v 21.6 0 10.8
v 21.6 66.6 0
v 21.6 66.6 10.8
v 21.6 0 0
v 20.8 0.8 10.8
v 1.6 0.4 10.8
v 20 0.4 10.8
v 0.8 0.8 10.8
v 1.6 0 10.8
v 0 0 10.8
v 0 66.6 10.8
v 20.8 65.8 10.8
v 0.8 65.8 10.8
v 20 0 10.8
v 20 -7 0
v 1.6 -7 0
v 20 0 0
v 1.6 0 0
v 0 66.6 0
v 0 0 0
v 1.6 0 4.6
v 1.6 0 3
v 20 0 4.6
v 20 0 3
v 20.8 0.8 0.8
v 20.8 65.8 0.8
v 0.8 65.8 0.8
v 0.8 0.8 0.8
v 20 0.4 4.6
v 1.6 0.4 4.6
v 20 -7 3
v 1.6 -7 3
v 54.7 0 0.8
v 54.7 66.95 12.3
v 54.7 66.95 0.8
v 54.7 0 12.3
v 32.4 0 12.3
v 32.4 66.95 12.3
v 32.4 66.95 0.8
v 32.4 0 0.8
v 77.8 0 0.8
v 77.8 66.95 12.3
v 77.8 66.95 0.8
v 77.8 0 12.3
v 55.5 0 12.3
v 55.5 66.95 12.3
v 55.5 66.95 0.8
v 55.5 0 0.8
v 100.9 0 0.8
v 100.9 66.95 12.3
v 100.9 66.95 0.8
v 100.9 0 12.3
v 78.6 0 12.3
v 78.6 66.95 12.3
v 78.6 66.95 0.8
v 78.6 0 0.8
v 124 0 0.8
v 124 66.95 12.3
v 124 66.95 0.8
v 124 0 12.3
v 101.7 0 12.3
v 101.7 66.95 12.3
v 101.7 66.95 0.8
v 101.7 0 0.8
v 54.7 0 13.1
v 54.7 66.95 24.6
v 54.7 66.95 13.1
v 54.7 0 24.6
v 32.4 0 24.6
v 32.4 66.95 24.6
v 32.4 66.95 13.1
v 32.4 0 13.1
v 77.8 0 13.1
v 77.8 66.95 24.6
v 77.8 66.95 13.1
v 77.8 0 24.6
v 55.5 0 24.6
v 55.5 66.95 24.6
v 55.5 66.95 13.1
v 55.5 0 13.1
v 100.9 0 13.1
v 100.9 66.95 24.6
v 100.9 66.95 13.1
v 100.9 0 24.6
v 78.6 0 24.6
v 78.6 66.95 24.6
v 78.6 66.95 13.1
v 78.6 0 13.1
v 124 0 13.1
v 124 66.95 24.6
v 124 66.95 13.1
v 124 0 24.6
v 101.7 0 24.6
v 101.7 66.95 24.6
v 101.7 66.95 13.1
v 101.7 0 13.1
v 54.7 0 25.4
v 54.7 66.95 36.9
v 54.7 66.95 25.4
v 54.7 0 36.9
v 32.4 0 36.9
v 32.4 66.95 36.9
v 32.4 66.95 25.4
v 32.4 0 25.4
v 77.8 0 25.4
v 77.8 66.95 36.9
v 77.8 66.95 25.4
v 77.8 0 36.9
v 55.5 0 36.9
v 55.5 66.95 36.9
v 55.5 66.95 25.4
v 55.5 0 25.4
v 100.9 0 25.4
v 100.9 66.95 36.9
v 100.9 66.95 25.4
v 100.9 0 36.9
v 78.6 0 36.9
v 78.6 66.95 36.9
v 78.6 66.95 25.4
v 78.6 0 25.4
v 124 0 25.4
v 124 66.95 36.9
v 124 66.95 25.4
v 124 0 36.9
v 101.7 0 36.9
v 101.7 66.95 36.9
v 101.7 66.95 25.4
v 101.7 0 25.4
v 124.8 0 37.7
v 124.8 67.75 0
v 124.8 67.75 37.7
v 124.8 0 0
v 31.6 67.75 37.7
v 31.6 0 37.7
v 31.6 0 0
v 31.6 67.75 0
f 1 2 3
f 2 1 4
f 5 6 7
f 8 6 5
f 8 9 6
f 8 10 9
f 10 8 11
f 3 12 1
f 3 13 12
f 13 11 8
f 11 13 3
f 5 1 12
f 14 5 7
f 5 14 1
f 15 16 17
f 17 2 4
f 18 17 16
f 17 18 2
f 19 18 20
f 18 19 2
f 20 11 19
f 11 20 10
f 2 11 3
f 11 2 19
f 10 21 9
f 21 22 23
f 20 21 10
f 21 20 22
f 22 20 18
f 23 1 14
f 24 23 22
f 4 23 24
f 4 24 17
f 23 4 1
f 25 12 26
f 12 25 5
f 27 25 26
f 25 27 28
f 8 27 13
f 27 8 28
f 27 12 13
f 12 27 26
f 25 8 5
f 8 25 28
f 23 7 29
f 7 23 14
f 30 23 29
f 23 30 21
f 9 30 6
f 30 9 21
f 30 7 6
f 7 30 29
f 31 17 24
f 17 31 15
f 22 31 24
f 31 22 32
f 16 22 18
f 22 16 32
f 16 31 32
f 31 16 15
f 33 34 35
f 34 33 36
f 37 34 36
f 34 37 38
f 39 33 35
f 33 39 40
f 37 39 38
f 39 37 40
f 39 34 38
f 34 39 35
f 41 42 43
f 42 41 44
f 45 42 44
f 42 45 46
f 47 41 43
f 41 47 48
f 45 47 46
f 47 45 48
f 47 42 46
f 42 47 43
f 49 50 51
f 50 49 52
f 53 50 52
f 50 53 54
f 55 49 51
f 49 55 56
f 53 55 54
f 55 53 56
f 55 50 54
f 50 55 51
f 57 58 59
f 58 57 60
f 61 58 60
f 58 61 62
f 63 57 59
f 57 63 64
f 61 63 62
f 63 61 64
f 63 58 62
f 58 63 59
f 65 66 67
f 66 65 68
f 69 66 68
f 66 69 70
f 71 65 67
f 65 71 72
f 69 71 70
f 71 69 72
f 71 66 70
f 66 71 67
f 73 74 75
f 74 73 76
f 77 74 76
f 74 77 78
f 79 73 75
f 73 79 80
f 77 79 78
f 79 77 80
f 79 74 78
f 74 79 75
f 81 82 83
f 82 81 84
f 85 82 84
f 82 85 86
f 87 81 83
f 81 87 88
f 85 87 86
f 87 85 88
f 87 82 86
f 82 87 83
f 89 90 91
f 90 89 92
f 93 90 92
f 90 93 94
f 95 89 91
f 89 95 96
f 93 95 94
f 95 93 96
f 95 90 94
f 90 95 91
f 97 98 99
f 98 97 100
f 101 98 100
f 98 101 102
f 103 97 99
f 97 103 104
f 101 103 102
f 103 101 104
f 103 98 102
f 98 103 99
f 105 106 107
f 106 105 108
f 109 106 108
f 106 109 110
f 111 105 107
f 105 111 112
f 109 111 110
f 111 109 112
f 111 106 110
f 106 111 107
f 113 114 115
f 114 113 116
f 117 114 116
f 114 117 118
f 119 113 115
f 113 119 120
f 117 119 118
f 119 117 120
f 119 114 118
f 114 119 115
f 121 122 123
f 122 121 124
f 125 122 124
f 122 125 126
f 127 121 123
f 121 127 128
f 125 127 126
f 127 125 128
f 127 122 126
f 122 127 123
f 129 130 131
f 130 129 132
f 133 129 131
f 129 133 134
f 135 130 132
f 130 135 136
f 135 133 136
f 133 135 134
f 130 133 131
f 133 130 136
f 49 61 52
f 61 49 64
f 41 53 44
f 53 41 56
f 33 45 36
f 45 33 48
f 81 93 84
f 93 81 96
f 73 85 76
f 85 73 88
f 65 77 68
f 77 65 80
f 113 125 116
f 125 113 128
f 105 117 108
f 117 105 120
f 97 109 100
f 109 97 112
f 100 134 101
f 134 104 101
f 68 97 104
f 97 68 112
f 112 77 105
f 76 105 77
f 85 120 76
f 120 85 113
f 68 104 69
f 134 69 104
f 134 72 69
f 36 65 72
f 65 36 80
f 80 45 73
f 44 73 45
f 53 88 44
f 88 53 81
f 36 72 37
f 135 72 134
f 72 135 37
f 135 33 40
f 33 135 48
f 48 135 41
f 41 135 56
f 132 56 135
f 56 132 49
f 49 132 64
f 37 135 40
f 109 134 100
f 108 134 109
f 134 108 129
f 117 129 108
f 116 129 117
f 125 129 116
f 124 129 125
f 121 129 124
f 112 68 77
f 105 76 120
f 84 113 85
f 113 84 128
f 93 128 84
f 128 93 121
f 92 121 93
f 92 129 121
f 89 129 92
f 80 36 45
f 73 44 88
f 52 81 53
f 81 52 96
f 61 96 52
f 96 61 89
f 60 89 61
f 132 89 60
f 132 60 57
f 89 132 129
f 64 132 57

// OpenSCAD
// preview[view:south west, tilt:top diagonal]

/* [Drawer: Base] */
// Inner width of the drawer
drawerWidthInner = 20;
// Inner height of the drawer
drawerHeightInner = 10;
// Inner length of the drawer
drawerLengthInner = 65;

/* [Drawer: Label] */
// Enable cutout for a label?
enabelLabel = "true"; // [true,false]
// The depth of the label should be the multiple of your nozzle size
depthLabel = 0.4;

/* [Drawer: Handle] */
// Height of the handle
handleHeight = 3;
// How  much the handle sticks out of the drawer
handleDepth = 7;
// The length of the handle. This should not be more than the width of the drawer 
handleLength = 18.4;
// Indent Width
handleIndentWidth = 0;
// Indent depth of top of handle
handleIndentTop = 0;
// Indent depth on the side of the handle
handleIndentSide = 0; 

/* [Enclosure] */
// Choose the amount of columns
columns = 4; // [1:100]
// Choose the amount of rows
rows = 3; // [1:100]
// The slot for the drawer will be by this much bigger than the drawer itself. Set this to a value accounting for shrinking/expansion of the material you are using.
enclosureClearance = 0.7;

/* [Printer specific] */
// Nozzle diameter of your printer
nozzleSize = 0.4;
// Walls should be a multiple of your nozzle size
walls = 0.8;

/* [View] */
// Which parts would you like to see?
part = "all"; // [drawer:Drawer Only, enclosure:Enclosure Only, all:Enclosure and Drawer]

/* [Hidden] */
drawerWidthOuter = drawerWidthInner + walls * 2;
drawerHeightOuter = drawerHeightInner + walls;
drawerLengthOuter = drawerLengthInner + walls * 2;

print_part();

module print_part() {
	if(part == "enclosure")
		rotate([270, 0, 0])
			printEnclosure();
	else if(part == "drawer")
		printDrawer();
	else
		printBoth();
}

module printEnclosure() {
	enclosure(rows, columns, drawerLengthOuter, drawerWidthOuter, drawerHeightOuter, enclosureClearance, walls);
}

module printDrawer() {
	drawer(drawerWidthInner, drawerHeightInner, drawerLengthInner, walls, enabelLabel, depthLabel, handleLength, handleDepth, handleHeight, handleIndentTop, handleIndentSide, handleIndentWidth);
}

module printBoth() {
	printDrawer();

	translate([drawerWidthOuter + 10, 0, 0])
		printEnclosure();
}

module enclosure(rows, columns, length, width, height, padding, walls) {
	widthSingle = width + padding;
	heightSingle = height + padding;
	lengthSingle = length + (padding / 2);

	widthOuter = (widthSingle + walls) * columns + walls;
	heightOuter = (heightSingle + walls) * rows + walls;
	lengthOuter = lengthSingle + walls;

	difference() {
		cube([widthOuter, lengthOuter, heightOuter]);
		
		for(row = [0 : rows - 1])
			for(column = [0 : columns - 1])
				translate([walls + (widthSingle + walls) * column, -1, walls + (heightSingle + walls) * row])
					cube([widthSingle, lengthSingle + 1, heightSingle]);
	}
	
}

module drawer(width, height, length, walls, label, depthLabel, lengthHandle, depthHandle, heightHandle, topIndent, sideIndent, widthIndent) {
	widthOuter = width + walls * 2;
	heightOuter = height + walls;
	lengthOuter = length + walls * 2;

	difference() {
		cube([widthOuter, lengthOuter, heightOuter]);

		translate([walls, walls, walls])
			cube([width, length, height + 1]);

		/* Cutout for the label */
		if(label== "true")
			translate([walls * 2, -1, handleHeight + walls * 2])
				cube([width - (walls * 2), 1 + depthLabel, height + 1]);
	}

	/* Attach the handle */
	translate([(widthOuter - lengthHandle) / 2, -depthHandle, 0]) {
		difference() {
			cube([lengthHandle, depthHandle, heightHandle]);

			/* Top indent */
			if(topIndent > 0 && widthIndent > 0)
				translate([-1, depthHandle - widthIndent, heightHandle - topIndent])
					cube([lengthHandle + 2, widthIndent + 1, topIndent + 1]);

			/* Left indent */
			if(sideIndent > 0 && widthIndent > 0)
				translate([-1, depthHandle - widthIndent, -1])
					cube([sideIndent + 1, widthIndent + 1, heightHandle + 2]);

			/* Right indent */
			if(sideIndent > 0 && widthIndent > 0)
				translate([lengthHandle - sideIndent, depthHandle - widthIndent, -1])
					cube([sideIndent + 1, widthIndent + 1, heightHandle + 2]);
		}
	}
}
